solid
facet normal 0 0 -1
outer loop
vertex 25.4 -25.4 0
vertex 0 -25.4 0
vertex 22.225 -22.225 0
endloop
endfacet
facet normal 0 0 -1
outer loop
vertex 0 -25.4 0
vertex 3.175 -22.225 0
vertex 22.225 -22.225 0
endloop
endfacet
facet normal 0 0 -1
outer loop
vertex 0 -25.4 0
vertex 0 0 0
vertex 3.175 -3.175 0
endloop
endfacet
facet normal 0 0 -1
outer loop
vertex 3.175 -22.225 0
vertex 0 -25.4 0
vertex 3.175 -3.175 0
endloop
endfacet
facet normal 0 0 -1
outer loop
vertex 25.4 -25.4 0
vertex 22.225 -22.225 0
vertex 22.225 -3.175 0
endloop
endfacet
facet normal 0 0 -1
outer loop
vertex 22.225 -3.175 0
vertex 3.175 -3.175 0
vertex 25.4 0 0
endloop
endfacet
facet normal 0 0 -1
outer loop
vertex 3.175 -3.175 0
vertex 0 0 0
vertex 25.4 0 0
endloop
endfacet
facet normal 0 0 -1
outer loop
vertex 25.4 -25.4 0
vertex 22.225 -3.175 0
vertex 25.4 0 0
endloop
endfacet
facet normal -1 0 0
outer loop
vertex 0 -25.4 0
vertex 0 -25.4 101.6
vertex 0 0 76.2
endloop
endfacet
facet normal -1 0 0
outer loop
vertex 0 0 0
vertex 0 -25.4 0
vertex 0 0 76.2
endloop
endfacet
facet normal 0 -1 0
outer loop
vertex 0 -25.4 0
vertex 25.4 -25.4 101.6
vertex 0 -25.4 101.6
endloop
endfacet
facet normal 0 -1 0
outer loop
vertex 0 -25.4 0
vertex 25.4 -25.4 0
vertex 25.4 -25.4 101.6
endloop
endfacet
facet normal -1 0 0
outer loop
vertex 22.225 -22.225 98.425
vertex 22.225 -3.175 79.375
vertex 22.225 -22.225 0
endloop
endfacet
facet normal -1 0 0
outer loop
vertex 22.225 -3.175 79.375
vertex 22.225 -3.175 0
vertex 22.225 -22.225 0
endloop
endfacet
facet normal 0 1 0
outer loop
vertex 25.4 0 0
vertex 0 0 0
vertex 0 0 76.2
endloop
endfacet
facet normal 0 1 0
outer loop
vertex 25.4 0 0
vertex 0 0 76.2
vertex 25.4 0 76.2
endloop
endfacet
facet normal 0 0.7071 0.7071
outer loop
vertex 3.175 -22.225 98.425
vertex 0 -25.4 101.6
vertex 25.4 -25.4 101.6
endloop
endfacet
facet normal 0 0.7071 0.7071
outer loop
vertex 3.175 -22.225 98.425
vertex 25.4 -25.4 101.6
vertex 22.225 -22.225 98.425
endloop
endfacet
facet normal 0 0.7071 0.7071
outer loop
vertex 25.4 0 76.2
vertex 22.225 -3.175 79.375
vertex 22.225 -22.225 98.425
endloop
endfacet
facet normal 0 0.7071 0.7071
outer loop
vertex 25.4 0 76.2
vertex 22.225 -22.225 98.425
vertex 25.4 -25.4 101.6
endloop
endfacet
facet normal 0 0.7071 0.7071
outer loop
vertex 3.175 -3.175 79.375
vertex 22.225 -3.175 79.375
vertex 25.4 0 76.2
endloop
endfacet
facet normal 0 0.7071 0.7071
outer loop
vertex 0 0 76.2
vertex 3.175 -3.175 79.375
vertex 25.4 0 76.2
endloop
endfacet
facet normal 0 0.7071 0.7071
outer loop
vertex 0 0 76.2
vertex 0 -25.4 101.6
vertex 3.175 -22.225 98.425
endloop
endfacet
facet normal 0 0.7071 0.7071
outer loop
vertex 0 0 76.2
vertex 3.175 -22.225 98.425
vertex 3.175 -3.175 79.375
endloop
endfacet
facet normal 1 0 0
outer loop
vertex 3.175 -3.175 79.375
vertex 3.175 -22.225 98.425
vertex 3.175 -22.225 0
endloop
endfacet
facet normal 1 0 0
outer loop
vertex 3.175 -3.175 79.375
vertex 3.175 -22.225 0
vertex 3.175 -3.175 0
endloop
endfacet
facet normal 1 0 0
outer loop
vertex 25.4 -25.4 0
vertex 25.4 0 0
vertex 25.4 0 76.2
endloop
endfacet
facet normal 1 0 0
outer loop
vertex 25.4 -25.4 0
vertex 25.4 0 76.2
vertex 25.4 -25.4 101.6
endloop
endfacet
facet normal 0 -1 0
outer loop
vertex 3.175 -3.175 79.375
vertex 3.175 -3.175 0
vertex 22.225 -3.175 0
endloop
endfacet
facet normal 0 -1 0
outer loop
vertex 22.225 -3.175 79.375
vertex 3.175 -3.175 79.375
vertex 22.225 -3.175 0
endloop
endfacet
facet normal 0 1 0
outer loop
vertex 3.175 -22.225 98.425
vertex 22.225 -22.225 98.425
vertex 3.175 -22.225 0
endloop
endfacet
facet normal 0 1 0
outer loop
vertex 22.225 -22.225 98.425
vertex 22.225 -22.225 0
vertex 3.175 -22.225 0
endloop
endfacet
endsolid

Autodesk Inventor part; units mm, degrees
ref_plane "YZ Plane" through (0, 0, 0) normal (1, 0, 0) x (0, 1, 0)
ref_plane "XZ Plane" through (0, 0, 0) normal (0, 1, 0) x (-1, 0, 0)
ref_plane "XY Plane" through (0, 0, 0) normal (0, 0, 1) x (1, 0, 0)
sketch "Sketch1" plane through (0, 0, 0) normal (0, 0, 1) x (1, 0, 0)
  line L0 (0, 0) -> (25.4, 0)
  line L1 (25.4, 0) -> (25.4, -25.4)
  line L2 (25.4, -25.4) -> (0, -25.4)
  line L3 (0, -25.4) -> (0, 0)
  line L4 (3.175, -3.175) -> (22.225, -3.175)
  line L5 (22.225, -3.175) -> (22.225, -22.225)
  line L6 (22.225, -22.225) -> (3.175, -22.225)
  line L7 (3.175, -22.225) -> (3.175, -3.175)
  dimension "d0" = 25.4
  dimension "d1" = 25.4
  dimension "d2" = 19.05
  dimension "d3" = 19.05
  dimension "d4" = 3.175
  dimension "d5" = 3.175
extrude "Extrusion1" add sketch "Sketch1" along normal blind 101.6
sketch "Sketch2" plane through (0, -25.4, 0) normal (-1, 0, 0) x (0, 0, 1)
  line L0 (101.6, 25.4) -> (101.6, 0) projected
  line L1 (101.6, 0) -> (76.2, 25.4)
  line L2 (0, 25.4) -> (101.6, 25.4) projected
  line L3 (101.6, 0) -> (137.521, 0) construction
  line L4 (76.2, 25.4) -> (101.6, 25.4)
  line L5 (101.6, 25.4) -> (101.6, 0)
  dimension "d8" = 135
extrude "Extrusion2" cut sketch "Sketch2" against normal blind 76.2
properties part number "1x1 mechanical stop" material "Aluminum 6061"
